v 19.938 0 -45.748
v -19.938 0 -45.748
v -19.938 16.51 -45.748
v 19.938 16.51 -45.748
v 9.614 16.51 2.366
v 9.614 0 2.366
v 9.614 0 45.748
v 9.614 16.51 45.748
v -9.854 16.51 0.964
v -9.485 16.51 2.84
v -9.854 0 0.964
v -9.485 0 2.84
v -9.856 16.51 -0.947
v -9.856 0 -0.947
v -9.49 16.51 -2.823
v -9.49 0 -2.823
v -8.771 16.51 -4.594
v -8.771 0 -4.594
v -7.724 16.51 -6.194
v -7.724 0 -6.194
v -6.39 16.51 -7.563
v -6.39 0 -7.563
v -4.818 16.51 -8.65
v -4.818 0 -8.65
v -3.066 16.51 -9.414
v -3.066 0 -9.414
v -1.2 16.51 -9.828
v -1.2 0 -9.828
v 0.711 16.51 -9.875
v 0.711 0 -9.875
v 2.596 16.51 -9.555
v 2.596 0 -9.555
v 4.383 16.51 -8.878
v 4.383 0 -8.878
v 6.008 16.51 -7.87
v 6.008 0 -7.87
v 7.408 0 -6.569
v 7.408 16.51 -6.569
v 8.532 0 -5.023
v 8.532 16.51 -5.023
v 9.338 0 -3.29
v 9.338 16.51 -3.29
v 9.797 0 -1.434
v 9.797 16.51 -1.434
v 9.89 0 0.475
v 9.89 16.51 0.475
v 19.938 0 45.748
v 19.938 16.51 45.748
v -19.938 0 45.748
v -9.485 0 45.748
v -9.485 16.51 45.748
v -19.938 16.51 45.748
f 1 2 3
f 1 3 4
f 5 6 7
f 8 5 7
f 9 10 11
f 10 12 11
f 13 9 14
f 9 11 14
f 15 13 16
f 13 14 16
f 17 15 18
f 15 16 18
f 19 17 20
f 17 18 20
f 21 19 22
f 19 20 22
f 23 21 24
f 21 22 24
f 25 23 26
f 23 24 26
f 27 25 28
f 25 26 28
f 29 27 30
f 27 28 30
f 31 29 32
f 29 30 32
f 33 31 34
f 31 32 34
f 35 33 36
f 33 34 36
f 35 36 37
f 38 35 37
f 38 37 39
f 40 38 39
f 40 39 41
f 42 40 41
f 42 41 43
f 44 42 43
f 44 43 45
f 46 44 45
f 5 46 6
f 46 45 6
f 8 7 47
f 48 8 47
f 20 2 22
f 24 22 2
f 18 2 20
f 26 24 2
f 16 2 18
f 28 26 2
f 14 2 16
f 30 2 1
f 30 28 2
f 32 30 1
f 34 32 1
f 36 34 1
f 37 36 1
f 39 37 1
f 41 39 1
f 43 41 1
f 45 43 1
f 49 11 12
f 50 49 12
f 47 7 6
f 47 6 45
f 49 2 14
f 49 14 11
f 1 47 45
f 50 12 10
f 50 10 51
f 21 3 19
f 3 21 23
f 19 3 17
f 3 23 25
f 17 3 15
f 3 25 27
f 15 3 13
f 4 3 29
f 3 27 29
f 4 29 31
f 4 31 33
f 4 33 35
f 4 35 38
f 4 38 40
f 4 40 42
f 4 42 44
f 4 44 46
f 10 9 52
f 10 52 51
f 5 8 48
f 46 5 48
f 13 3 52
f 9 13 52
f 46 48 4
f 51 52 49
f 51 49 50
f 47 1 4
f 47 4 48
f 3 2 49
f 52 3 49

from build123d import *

# Parameters (mm, degrees)
F0_W     = 39.875954
F0_H     = 91.495306
F1_DEPTH = 16.51
F2_R     = 9.901049
F3_DEPTH = 39.878
F4_W     = 19.099163
F4_H     = 47.554333
F5_DEPTH = 25.4


with BuildPart() as f1:
    # F0 (on Front) → F1 (new body)
    with BuildSketch(Plane.XZ):
        Rectangle(F0_W, F0_H)
    extrude(amount=-F1_DEPTH)

    # F2 (on face) → F3 (cut)
    with BuildSketch(Plane.XZ):
        Circle(F2_R)
    extrude(amount=-F3_DEPTH, mode=Mode.SUBTRACT)

    # F4 (on Front) → F5 (cut)
    with BuildSketch(Plane.XZ):
        with Locations((0.064525, 23.777166)):
            Rectangle(F4_W, F4_H)
    extrude(amount=-F5_DEPTH, mode=Mode.SUBTRACT)


solid = f1.part
